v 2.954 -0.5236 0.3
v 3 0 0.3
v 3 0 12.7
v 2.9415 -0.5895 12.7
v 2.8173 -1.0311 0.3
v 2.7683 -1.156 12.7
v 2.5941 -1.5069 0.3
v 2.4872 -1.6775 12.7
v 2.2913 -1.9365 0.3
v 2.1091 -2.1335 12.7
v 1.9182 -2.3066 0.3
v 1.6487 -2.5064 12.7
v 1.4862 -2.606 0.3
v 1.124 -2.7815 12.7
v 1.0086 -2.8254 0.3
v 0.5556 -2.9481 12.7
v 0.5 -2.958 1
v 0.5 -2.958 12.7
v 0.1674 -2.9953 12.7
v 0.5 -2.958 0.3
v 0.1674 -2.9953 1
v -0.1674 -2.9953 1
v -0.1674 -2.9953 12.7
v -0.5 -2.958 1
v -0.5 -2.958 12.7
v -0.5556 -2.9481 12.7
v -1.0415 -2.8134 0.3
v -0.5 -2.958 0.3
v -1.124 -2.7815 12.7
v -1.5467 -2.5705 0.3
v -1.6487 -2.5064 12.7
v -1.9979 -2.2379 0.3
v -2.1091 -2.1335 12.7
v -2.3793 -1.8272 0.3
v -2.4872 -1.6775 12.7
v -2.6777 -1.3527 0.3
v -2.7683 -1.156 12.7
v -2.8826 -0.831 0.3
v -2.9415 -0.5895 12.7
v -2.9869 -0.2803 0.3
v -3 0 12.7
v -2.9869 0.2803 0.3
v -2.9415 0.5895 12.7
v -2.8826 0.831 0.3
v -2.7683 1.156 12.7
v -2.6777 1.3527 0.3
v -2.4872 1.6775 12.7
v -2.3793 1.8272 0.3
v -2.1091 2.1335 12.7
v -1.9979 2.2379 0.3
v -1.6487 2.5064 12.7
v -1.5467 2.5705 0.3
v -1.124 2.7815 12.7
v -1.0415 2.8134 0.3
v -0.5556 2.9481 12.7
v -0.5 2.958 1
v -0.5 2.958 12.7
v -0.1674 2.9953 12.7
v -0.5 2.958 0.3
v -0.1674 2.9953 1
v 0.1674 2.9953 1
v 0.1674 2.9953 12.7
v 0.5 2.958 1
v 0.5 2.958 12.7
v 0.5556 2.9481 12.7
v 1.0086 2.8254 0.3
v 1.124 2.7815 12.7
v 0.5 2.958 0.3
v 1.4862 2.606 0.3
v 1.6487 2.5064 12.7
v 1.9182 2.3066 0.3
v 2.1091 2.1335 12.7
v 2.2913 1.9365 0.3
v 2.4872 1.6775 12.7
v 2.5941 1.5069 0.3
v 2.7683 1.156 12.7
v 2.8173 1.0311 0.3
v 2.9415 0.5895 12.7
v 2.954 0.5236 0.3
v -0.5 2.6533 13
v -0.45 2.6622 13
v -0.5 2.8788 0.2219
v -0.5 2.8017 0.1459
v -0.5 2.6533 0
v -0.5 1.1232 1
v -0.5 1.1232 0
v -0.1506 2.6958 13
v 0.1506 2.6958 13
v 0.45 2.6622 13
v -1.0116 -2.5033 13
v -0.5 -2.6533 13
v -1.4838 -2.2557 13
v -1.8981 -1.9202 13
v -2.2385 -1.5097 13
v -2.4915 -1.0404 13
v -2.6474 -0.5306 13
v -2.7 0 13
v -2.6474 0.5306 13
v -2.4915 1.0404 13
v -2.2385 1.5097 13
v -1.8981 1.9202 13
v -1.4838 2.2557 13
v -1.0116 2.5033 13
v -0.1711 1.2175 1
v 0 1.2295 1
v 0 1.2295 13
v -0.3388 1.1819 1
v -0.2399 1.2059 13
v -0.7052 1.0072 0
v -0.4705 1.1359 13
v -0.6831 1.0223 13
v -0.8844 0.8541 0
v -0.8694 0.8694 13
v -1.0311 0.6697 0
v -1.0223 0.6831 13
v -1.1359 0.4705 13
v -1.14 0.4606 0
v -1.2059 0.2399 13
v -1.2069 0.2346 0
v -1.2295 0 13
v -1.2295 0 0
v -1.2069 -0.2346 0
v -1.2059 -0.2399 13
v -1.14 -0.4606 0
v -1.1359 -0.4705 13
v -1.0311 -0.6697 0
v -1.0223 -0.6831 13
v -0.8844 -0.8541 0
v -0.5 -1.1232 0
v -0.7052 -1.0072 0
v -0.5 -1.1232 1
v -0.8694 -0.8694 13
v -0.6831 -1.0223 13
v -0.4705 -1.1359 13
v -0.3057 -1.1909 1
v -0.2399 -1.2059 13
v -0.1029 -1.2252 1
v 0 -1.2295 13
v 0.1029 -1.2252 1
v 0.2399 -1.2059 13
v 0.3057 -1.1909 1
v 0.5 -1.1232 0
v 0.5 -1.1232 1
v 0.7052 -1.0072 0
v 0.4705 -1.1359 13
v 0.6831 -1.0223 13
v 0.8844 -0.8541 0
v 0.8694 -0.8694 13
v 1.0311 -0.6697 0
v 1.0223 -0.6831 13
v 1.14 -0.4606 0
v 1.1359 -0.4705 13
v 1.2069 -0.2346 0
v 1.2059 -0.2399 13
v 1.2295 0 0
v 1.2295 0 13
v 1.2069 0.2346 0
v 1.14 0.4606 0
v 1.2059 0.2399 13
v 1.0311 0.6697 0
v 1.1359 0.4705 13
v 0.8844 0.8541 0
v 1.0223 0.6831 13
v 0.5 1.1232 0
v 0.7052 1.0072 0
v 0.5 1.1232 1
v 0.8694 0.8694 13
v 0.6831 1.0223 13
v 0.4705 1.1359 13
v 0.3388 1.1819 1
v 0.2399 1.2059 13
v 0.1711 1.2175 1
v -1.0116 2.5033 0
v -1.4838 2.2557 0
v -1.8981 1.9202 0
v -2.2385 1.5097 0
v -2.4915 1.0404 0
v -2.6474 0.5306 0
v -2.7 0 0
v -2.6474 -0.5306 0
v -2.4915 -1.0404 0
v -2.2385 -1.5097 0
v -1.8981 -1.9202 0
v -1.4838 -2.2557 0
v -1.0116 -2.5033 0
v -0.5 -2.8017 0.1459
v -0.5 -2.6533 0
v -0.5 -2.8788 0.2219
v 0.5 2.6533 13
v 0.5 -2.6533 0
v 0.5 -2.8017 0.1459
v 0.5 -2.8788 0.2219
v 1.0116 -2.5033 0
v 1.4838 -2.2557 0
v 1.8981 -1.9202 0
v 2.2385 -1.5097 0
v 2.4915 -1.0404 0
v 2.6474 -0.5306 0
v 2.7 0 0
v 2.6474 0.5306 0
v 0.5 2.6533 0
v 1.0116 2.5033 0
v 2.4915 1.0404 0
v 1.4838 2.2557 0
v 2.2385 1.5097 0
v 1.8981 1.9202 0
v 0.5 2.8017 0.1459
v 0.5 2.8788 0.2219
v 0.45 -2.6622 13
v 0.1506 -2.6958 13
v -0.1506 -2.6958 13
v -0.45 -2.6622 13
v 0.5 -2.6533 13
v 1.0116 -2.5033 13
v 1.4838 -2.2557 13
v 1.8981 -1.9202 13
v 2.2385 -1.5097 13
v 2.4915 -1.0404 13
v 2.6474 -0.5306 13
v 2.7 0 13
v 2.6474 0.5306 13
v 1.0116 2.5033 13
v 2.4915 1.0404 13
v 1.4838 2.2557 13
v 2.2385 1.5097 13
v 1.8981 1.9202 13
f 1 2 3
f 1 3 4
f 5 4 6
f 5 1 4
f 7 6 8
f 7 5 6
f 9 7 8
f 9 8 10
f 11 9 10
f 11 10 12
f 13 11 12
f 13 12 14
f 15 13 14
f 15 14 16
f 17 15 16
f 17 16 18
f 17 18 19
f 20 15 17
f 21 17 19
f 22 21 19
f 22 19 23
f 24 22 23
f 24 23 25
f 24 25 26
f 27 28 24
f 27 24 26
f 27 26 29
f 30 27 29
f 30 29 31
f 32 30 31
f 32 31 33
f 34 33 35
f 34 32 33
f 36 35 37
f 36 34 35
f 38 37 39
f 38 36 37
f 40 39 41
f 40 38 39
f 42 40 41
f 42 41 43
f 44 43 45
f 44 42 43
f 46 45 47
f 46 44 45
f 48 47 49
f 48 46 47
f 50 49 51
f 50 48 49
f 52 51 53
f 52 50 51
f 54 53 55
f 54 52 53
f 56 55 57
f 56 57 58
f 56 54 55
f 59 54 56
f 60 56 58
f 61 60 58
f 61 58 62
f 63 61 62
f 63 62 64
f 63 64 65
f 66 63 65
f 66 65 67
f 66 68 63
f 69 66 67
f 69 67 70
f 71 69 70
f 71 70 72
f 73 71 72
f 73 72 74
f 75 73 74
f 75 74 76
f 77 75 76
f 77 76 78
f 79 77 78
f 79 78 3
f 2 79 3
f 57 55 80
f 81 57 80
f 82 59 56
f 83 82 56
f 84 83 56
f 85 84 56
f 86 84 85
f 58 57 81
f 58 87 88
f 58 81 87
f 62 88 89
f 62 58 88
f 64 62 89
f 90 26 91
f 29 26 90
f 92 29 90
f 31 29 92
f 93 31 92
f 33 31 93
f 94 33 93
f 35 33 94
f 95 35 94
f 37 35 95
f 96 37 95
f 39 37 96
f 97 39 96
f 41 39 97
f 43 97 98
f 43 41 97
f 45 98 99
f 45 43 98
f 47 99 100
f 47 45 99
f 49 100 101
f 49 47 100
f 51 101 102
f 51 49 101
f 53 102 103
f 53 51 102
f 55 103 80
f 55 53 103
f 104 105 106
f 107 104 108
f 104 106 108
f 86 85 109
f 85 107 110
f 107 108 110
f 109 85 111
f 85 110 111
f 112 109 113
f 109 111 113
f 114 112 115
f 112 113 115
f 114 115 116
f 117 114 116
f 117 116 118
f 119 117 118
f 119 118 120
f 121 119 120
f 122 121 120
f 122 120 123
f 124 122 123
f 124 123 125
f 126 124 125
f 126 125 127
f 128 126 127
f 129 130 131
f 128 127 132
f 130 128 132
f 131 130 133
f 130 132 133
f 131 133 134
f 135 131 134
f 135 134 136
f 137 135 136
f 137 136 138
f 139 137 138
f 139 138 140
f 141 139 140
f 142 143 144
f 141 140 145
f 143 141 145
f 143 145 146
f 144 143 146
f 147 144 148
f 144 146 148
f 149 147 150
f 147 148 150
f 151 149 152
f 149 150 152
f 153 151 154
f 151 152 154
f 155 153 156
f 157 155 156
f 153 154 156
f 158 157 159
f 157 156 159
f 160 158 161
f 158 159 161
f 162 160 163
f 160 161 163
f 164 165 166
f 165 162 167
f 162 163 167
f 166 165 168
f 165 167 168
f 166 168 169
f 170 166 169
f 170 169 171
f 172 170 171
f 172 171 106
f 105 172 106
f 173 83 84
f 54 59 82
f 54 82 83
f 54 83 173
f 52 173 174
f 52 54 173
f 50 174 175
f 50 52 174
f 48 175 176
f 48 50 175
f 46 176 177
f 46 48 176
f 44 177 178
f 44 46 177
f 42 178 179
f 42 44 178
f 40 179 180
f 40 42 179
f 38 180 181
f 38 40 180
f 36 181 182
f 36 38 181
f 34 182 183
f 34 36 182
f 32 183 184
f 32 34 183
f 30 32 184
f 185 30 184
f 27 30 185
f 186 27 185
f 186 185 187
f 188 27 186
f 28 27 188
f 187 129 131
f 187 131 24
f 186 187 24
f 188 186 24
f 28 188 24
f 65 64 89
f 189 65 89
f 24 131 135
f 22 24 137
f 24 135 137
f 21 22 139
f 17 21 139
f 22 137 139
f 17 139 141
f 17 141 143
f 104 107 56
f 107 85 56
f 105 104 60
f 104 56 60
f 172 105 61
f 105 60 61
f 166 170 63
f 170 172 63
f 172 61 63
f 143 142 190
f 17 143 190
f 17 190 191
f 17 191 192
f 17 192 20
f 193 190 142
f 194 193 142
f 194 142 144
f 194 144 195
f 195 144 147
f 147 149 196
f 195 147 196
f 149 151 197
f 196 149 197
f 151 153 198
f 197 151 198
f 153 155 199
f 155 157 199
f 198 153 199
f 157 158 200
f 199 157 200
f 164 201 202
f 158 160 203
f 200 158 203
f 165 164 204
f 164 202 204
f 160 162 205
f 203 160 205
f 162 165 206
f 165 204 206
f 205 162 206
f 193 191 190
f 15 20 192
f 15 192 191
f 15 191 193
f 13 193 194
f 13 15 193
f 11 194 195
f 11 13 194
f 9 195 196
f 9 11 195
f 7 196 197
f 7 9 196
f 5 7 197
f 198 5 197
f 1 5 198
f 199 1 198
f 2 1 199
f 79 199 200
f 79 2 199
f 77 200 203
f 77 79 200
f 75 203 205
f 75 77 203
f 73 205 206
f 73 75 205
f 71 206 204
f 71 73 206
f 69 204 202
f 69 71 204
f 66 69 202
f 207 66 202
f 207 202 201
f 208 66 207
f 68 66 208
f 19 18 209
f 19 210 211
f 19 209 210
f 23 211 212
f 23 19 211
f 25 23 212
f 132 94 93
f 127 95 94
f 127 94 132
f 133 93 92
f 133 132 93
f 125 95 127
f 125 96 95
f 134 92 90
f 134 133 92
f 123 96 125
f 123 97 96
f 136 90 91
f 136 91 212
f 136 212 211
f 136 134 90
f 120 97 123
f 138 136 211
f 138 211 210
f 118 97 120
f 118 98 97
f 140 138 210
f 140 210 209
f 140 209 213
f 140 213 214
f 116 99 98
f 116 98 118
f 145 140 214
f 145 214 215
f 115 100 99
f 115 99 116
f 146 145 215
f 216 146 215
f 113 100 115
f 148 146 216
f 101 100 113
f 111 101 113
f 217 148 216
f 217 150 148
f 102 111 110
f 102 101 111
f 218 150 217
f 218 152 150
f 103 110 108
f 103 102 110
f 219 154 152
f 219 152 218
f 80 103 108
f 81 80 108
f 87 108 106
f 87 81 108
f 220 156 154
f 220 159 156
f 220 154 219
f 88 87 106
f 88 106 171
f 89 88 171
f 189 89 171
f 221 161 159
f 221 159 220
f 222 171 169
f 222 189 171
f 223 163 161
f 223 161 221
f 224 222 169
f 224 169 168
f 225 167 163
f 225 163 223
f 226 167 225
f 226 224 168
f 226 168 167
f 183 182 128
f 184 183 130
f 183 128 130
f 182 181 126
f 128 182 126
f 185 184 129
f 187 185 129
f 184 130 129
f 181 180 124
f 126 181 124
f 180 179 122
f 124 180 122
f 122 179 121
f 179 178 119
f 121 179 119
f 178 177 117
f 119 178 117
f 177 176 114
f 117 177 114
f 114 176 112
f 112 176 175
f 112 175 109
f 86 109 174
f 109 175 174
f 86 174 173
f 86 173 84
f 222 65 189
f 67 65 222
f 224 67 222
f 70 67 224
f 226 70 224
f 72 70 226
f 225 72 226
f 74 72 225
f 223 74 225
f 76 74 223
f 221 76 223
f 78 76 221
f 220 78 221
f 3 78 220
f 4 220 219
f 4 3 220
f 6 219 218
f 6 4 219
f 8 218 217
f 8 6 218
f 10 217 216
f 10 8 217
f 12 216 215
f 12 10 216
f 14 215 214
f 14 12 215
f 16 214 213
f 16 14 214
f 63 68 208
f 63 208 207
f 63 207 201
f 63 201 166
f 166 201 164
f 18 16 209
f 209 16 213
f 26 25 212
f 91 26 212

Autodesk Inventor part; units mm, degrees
ref_plane "YZ Plane" through (0, 0, 0) normal (1, 0, 0) x (0, 1, 0)
ref_plane "XZ Plane" through (0, 0, 0) normal (0, 1, 0) x (-1, 0, 0)
ref_plane "XY Plane" through (0, 0, 0) normal (0, 0, 1) x (1, 0, 0)
sketch "スケッチ1" plane through (0, 0, 0) normal (0, 0, 1) x (1, 0, 0)
  circle A0 centre (0, 0) radius 3
  line L0 (0, 3) -> (0, -3) construction
  line L1 (-0.5, 2.958) -> (-0.5, -2.958)
  line L2 (0.5, 2.958) -> (0.5, -2.958)
  dimension "d0" = 6
  dimension "d1" = 1
extrude "押し出し1" add sketch "スケッチ1" along normal blind 13
extrude "押し出し2" cut sketch "スケッチ1" along normal blind 1 contours L2 A0 L1
chamfer "面取り1" distance 0.3 angle 45 4 edges at (-3, 0, 13) (2.2913, 1.9365, 0) (2.2913, -1.9365, 0) (-3, 0, 0)
hole "穴1" at (0, 0, 0) direction (0, 0, 1) diameter 2.459 end through all thread size "M3x0.5" class "6H" standard "ISO Metric profile"
properties part number "ARL-313SBE" material "アルミニウム 2014-T4"
